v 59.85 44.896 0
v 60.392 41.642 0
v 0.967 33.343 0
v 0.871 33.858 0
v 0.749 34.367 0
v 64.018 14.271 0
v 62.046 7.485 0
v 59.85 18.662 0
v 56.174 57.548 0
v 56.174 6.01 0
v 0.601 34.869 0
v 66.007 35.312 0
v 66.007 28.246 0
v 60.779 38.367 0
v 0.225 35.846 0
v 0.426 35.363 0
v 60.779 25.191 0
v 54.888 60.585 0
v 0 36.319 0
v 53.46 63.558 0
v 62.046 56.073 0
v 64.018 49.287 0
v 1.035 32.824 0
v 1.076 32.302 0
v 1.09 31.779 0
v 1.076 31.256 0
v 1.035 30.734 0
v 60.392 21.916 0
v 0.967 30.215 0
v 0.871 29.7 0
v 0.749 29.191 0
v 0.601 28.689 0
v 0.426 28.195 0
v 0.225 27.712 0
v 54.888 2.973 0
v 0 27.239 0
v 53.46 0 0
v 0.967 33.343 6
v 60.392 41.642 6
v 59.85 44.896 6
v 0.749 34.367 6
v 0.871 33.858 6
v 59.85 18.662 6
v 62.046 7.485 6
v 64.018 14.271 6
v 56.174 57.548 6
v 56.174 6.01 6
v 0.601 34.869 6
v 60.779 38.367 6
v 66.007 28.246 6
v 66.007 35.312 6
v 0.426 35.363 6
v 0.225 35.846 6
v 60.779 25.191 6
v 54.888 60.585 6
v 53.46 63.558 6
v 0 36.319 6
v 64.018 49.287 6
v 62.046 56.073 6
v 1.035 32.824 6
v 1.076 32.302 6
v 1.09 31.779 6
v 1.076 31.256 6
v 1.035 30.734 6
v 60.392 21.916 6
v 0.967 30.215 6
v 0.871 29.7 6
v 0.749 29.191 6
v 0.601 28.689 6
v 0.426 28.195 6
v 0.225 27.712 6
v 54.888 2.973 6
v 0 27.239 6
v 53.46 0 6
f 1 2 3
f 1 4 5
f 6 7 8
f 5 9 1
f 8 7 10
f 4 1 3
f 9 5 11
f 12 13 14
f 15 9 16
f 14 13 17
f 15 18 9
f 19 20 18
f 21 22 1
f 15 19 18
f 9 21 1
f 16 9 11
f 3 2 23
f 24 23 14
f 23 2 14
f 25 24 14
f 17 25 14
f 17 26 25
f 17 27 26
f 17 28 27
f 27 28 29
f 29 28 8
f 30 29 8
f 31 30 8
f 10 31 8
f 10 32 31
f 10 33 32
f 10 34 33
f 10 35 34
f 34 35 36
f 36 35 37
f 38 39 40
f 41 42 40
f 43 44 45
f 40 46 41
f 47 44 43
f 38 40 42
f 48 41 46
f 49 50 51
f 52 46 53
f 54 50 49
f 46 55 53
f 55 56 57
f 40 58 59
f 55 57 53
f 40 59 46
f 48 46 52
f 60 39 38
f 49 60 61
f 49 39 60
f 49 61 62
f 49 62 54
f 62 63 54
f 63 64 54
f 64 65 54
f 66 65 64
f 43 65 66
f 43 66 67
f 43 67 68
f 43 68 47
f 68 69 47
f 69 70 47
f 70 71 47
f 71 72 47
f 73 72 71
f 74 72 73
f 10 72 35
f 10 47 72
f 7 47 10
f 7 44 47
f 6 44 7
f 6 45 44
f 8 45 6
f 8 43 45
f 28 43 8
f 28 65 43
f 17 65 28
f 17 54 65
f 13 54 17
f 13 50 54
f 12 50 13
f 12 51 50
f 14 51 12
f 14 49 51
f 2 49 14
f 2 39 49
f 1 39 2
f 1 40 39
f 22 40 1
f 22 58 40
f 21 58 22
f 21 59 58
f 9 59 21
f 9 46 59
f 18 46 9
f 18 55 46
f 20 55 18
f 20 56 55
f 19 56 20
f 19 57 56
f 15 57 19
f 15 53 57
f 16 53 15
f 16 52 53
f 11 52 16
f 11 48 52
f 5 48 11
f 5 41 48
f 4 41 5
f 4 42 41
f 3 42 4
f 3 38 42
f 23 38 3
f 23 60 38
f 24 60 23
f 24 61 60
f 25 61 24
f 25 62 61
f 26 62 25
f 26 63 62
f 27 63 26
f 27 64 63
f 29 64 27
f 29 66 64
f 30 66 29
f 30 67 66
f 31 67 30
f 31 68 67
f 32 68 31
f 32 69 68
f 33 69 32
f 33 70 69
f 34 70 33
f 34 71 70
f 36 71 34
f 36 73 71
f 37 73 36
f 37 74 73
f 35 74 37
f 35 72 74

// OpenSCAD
$fn = 32;

// ----------------------------------------------------------------------
// Gear sector: 3 teeth on 54 degrees
// ----------------------------------------------------------------------

// --- parameters (mm) ---
sector_angle = 54;        // sector angle, degrees
root_r = 70;              // root circle radius
tooth_h = 5;              // tooth height over the root circle
teeth = 3;                // number of teeth on the sector
hub_r = 10;               // hub bore radius
plate_t = 6;              // sector thickness, Z
arc_step = 3;             // sampling step of the root/hub arcs, degrees

tip_r = root_r + tooth_h;  // tip circle radius

profile = [[53.46, 0], [54.888, 2.973], [56.174, 6.01], [62.046, 7.485], [64.018, 14.271], [59.85, 18.662], [60.392, 21.916], [60.779, 25.191], [66.007, 28.246], [66.007, 35.312], [60.779, 38.367], [60.392, 41.642], [59.85, 44.896], [64.018, 49.287], [62.046, 56.073], [56.174, 57.548], [54.888, 60.585], [53.46, 63.558], [0, 36.319], [0.225, 35.846], [0.426, 35.363], [0.601, 34.869], [0.749, 34.367], [0.871, 33.858], [0.967, 33.343], [1.035, 32.824], [1.076, 32.302], [1.09, 31.779], [1.076, 31.256], [1.035, 30.734], [0.967, 30.215], [0.871, 29.7], [0.749, 29.191], [0.601, 28.689], [0.426, 28.195], [0.225, 27.712], [0, 27.239]];  // primary outline, 37 points, counter clockwise

// --- the one profile operation ---
linear_extrude(height = plate_t) polygon(points = profile);
